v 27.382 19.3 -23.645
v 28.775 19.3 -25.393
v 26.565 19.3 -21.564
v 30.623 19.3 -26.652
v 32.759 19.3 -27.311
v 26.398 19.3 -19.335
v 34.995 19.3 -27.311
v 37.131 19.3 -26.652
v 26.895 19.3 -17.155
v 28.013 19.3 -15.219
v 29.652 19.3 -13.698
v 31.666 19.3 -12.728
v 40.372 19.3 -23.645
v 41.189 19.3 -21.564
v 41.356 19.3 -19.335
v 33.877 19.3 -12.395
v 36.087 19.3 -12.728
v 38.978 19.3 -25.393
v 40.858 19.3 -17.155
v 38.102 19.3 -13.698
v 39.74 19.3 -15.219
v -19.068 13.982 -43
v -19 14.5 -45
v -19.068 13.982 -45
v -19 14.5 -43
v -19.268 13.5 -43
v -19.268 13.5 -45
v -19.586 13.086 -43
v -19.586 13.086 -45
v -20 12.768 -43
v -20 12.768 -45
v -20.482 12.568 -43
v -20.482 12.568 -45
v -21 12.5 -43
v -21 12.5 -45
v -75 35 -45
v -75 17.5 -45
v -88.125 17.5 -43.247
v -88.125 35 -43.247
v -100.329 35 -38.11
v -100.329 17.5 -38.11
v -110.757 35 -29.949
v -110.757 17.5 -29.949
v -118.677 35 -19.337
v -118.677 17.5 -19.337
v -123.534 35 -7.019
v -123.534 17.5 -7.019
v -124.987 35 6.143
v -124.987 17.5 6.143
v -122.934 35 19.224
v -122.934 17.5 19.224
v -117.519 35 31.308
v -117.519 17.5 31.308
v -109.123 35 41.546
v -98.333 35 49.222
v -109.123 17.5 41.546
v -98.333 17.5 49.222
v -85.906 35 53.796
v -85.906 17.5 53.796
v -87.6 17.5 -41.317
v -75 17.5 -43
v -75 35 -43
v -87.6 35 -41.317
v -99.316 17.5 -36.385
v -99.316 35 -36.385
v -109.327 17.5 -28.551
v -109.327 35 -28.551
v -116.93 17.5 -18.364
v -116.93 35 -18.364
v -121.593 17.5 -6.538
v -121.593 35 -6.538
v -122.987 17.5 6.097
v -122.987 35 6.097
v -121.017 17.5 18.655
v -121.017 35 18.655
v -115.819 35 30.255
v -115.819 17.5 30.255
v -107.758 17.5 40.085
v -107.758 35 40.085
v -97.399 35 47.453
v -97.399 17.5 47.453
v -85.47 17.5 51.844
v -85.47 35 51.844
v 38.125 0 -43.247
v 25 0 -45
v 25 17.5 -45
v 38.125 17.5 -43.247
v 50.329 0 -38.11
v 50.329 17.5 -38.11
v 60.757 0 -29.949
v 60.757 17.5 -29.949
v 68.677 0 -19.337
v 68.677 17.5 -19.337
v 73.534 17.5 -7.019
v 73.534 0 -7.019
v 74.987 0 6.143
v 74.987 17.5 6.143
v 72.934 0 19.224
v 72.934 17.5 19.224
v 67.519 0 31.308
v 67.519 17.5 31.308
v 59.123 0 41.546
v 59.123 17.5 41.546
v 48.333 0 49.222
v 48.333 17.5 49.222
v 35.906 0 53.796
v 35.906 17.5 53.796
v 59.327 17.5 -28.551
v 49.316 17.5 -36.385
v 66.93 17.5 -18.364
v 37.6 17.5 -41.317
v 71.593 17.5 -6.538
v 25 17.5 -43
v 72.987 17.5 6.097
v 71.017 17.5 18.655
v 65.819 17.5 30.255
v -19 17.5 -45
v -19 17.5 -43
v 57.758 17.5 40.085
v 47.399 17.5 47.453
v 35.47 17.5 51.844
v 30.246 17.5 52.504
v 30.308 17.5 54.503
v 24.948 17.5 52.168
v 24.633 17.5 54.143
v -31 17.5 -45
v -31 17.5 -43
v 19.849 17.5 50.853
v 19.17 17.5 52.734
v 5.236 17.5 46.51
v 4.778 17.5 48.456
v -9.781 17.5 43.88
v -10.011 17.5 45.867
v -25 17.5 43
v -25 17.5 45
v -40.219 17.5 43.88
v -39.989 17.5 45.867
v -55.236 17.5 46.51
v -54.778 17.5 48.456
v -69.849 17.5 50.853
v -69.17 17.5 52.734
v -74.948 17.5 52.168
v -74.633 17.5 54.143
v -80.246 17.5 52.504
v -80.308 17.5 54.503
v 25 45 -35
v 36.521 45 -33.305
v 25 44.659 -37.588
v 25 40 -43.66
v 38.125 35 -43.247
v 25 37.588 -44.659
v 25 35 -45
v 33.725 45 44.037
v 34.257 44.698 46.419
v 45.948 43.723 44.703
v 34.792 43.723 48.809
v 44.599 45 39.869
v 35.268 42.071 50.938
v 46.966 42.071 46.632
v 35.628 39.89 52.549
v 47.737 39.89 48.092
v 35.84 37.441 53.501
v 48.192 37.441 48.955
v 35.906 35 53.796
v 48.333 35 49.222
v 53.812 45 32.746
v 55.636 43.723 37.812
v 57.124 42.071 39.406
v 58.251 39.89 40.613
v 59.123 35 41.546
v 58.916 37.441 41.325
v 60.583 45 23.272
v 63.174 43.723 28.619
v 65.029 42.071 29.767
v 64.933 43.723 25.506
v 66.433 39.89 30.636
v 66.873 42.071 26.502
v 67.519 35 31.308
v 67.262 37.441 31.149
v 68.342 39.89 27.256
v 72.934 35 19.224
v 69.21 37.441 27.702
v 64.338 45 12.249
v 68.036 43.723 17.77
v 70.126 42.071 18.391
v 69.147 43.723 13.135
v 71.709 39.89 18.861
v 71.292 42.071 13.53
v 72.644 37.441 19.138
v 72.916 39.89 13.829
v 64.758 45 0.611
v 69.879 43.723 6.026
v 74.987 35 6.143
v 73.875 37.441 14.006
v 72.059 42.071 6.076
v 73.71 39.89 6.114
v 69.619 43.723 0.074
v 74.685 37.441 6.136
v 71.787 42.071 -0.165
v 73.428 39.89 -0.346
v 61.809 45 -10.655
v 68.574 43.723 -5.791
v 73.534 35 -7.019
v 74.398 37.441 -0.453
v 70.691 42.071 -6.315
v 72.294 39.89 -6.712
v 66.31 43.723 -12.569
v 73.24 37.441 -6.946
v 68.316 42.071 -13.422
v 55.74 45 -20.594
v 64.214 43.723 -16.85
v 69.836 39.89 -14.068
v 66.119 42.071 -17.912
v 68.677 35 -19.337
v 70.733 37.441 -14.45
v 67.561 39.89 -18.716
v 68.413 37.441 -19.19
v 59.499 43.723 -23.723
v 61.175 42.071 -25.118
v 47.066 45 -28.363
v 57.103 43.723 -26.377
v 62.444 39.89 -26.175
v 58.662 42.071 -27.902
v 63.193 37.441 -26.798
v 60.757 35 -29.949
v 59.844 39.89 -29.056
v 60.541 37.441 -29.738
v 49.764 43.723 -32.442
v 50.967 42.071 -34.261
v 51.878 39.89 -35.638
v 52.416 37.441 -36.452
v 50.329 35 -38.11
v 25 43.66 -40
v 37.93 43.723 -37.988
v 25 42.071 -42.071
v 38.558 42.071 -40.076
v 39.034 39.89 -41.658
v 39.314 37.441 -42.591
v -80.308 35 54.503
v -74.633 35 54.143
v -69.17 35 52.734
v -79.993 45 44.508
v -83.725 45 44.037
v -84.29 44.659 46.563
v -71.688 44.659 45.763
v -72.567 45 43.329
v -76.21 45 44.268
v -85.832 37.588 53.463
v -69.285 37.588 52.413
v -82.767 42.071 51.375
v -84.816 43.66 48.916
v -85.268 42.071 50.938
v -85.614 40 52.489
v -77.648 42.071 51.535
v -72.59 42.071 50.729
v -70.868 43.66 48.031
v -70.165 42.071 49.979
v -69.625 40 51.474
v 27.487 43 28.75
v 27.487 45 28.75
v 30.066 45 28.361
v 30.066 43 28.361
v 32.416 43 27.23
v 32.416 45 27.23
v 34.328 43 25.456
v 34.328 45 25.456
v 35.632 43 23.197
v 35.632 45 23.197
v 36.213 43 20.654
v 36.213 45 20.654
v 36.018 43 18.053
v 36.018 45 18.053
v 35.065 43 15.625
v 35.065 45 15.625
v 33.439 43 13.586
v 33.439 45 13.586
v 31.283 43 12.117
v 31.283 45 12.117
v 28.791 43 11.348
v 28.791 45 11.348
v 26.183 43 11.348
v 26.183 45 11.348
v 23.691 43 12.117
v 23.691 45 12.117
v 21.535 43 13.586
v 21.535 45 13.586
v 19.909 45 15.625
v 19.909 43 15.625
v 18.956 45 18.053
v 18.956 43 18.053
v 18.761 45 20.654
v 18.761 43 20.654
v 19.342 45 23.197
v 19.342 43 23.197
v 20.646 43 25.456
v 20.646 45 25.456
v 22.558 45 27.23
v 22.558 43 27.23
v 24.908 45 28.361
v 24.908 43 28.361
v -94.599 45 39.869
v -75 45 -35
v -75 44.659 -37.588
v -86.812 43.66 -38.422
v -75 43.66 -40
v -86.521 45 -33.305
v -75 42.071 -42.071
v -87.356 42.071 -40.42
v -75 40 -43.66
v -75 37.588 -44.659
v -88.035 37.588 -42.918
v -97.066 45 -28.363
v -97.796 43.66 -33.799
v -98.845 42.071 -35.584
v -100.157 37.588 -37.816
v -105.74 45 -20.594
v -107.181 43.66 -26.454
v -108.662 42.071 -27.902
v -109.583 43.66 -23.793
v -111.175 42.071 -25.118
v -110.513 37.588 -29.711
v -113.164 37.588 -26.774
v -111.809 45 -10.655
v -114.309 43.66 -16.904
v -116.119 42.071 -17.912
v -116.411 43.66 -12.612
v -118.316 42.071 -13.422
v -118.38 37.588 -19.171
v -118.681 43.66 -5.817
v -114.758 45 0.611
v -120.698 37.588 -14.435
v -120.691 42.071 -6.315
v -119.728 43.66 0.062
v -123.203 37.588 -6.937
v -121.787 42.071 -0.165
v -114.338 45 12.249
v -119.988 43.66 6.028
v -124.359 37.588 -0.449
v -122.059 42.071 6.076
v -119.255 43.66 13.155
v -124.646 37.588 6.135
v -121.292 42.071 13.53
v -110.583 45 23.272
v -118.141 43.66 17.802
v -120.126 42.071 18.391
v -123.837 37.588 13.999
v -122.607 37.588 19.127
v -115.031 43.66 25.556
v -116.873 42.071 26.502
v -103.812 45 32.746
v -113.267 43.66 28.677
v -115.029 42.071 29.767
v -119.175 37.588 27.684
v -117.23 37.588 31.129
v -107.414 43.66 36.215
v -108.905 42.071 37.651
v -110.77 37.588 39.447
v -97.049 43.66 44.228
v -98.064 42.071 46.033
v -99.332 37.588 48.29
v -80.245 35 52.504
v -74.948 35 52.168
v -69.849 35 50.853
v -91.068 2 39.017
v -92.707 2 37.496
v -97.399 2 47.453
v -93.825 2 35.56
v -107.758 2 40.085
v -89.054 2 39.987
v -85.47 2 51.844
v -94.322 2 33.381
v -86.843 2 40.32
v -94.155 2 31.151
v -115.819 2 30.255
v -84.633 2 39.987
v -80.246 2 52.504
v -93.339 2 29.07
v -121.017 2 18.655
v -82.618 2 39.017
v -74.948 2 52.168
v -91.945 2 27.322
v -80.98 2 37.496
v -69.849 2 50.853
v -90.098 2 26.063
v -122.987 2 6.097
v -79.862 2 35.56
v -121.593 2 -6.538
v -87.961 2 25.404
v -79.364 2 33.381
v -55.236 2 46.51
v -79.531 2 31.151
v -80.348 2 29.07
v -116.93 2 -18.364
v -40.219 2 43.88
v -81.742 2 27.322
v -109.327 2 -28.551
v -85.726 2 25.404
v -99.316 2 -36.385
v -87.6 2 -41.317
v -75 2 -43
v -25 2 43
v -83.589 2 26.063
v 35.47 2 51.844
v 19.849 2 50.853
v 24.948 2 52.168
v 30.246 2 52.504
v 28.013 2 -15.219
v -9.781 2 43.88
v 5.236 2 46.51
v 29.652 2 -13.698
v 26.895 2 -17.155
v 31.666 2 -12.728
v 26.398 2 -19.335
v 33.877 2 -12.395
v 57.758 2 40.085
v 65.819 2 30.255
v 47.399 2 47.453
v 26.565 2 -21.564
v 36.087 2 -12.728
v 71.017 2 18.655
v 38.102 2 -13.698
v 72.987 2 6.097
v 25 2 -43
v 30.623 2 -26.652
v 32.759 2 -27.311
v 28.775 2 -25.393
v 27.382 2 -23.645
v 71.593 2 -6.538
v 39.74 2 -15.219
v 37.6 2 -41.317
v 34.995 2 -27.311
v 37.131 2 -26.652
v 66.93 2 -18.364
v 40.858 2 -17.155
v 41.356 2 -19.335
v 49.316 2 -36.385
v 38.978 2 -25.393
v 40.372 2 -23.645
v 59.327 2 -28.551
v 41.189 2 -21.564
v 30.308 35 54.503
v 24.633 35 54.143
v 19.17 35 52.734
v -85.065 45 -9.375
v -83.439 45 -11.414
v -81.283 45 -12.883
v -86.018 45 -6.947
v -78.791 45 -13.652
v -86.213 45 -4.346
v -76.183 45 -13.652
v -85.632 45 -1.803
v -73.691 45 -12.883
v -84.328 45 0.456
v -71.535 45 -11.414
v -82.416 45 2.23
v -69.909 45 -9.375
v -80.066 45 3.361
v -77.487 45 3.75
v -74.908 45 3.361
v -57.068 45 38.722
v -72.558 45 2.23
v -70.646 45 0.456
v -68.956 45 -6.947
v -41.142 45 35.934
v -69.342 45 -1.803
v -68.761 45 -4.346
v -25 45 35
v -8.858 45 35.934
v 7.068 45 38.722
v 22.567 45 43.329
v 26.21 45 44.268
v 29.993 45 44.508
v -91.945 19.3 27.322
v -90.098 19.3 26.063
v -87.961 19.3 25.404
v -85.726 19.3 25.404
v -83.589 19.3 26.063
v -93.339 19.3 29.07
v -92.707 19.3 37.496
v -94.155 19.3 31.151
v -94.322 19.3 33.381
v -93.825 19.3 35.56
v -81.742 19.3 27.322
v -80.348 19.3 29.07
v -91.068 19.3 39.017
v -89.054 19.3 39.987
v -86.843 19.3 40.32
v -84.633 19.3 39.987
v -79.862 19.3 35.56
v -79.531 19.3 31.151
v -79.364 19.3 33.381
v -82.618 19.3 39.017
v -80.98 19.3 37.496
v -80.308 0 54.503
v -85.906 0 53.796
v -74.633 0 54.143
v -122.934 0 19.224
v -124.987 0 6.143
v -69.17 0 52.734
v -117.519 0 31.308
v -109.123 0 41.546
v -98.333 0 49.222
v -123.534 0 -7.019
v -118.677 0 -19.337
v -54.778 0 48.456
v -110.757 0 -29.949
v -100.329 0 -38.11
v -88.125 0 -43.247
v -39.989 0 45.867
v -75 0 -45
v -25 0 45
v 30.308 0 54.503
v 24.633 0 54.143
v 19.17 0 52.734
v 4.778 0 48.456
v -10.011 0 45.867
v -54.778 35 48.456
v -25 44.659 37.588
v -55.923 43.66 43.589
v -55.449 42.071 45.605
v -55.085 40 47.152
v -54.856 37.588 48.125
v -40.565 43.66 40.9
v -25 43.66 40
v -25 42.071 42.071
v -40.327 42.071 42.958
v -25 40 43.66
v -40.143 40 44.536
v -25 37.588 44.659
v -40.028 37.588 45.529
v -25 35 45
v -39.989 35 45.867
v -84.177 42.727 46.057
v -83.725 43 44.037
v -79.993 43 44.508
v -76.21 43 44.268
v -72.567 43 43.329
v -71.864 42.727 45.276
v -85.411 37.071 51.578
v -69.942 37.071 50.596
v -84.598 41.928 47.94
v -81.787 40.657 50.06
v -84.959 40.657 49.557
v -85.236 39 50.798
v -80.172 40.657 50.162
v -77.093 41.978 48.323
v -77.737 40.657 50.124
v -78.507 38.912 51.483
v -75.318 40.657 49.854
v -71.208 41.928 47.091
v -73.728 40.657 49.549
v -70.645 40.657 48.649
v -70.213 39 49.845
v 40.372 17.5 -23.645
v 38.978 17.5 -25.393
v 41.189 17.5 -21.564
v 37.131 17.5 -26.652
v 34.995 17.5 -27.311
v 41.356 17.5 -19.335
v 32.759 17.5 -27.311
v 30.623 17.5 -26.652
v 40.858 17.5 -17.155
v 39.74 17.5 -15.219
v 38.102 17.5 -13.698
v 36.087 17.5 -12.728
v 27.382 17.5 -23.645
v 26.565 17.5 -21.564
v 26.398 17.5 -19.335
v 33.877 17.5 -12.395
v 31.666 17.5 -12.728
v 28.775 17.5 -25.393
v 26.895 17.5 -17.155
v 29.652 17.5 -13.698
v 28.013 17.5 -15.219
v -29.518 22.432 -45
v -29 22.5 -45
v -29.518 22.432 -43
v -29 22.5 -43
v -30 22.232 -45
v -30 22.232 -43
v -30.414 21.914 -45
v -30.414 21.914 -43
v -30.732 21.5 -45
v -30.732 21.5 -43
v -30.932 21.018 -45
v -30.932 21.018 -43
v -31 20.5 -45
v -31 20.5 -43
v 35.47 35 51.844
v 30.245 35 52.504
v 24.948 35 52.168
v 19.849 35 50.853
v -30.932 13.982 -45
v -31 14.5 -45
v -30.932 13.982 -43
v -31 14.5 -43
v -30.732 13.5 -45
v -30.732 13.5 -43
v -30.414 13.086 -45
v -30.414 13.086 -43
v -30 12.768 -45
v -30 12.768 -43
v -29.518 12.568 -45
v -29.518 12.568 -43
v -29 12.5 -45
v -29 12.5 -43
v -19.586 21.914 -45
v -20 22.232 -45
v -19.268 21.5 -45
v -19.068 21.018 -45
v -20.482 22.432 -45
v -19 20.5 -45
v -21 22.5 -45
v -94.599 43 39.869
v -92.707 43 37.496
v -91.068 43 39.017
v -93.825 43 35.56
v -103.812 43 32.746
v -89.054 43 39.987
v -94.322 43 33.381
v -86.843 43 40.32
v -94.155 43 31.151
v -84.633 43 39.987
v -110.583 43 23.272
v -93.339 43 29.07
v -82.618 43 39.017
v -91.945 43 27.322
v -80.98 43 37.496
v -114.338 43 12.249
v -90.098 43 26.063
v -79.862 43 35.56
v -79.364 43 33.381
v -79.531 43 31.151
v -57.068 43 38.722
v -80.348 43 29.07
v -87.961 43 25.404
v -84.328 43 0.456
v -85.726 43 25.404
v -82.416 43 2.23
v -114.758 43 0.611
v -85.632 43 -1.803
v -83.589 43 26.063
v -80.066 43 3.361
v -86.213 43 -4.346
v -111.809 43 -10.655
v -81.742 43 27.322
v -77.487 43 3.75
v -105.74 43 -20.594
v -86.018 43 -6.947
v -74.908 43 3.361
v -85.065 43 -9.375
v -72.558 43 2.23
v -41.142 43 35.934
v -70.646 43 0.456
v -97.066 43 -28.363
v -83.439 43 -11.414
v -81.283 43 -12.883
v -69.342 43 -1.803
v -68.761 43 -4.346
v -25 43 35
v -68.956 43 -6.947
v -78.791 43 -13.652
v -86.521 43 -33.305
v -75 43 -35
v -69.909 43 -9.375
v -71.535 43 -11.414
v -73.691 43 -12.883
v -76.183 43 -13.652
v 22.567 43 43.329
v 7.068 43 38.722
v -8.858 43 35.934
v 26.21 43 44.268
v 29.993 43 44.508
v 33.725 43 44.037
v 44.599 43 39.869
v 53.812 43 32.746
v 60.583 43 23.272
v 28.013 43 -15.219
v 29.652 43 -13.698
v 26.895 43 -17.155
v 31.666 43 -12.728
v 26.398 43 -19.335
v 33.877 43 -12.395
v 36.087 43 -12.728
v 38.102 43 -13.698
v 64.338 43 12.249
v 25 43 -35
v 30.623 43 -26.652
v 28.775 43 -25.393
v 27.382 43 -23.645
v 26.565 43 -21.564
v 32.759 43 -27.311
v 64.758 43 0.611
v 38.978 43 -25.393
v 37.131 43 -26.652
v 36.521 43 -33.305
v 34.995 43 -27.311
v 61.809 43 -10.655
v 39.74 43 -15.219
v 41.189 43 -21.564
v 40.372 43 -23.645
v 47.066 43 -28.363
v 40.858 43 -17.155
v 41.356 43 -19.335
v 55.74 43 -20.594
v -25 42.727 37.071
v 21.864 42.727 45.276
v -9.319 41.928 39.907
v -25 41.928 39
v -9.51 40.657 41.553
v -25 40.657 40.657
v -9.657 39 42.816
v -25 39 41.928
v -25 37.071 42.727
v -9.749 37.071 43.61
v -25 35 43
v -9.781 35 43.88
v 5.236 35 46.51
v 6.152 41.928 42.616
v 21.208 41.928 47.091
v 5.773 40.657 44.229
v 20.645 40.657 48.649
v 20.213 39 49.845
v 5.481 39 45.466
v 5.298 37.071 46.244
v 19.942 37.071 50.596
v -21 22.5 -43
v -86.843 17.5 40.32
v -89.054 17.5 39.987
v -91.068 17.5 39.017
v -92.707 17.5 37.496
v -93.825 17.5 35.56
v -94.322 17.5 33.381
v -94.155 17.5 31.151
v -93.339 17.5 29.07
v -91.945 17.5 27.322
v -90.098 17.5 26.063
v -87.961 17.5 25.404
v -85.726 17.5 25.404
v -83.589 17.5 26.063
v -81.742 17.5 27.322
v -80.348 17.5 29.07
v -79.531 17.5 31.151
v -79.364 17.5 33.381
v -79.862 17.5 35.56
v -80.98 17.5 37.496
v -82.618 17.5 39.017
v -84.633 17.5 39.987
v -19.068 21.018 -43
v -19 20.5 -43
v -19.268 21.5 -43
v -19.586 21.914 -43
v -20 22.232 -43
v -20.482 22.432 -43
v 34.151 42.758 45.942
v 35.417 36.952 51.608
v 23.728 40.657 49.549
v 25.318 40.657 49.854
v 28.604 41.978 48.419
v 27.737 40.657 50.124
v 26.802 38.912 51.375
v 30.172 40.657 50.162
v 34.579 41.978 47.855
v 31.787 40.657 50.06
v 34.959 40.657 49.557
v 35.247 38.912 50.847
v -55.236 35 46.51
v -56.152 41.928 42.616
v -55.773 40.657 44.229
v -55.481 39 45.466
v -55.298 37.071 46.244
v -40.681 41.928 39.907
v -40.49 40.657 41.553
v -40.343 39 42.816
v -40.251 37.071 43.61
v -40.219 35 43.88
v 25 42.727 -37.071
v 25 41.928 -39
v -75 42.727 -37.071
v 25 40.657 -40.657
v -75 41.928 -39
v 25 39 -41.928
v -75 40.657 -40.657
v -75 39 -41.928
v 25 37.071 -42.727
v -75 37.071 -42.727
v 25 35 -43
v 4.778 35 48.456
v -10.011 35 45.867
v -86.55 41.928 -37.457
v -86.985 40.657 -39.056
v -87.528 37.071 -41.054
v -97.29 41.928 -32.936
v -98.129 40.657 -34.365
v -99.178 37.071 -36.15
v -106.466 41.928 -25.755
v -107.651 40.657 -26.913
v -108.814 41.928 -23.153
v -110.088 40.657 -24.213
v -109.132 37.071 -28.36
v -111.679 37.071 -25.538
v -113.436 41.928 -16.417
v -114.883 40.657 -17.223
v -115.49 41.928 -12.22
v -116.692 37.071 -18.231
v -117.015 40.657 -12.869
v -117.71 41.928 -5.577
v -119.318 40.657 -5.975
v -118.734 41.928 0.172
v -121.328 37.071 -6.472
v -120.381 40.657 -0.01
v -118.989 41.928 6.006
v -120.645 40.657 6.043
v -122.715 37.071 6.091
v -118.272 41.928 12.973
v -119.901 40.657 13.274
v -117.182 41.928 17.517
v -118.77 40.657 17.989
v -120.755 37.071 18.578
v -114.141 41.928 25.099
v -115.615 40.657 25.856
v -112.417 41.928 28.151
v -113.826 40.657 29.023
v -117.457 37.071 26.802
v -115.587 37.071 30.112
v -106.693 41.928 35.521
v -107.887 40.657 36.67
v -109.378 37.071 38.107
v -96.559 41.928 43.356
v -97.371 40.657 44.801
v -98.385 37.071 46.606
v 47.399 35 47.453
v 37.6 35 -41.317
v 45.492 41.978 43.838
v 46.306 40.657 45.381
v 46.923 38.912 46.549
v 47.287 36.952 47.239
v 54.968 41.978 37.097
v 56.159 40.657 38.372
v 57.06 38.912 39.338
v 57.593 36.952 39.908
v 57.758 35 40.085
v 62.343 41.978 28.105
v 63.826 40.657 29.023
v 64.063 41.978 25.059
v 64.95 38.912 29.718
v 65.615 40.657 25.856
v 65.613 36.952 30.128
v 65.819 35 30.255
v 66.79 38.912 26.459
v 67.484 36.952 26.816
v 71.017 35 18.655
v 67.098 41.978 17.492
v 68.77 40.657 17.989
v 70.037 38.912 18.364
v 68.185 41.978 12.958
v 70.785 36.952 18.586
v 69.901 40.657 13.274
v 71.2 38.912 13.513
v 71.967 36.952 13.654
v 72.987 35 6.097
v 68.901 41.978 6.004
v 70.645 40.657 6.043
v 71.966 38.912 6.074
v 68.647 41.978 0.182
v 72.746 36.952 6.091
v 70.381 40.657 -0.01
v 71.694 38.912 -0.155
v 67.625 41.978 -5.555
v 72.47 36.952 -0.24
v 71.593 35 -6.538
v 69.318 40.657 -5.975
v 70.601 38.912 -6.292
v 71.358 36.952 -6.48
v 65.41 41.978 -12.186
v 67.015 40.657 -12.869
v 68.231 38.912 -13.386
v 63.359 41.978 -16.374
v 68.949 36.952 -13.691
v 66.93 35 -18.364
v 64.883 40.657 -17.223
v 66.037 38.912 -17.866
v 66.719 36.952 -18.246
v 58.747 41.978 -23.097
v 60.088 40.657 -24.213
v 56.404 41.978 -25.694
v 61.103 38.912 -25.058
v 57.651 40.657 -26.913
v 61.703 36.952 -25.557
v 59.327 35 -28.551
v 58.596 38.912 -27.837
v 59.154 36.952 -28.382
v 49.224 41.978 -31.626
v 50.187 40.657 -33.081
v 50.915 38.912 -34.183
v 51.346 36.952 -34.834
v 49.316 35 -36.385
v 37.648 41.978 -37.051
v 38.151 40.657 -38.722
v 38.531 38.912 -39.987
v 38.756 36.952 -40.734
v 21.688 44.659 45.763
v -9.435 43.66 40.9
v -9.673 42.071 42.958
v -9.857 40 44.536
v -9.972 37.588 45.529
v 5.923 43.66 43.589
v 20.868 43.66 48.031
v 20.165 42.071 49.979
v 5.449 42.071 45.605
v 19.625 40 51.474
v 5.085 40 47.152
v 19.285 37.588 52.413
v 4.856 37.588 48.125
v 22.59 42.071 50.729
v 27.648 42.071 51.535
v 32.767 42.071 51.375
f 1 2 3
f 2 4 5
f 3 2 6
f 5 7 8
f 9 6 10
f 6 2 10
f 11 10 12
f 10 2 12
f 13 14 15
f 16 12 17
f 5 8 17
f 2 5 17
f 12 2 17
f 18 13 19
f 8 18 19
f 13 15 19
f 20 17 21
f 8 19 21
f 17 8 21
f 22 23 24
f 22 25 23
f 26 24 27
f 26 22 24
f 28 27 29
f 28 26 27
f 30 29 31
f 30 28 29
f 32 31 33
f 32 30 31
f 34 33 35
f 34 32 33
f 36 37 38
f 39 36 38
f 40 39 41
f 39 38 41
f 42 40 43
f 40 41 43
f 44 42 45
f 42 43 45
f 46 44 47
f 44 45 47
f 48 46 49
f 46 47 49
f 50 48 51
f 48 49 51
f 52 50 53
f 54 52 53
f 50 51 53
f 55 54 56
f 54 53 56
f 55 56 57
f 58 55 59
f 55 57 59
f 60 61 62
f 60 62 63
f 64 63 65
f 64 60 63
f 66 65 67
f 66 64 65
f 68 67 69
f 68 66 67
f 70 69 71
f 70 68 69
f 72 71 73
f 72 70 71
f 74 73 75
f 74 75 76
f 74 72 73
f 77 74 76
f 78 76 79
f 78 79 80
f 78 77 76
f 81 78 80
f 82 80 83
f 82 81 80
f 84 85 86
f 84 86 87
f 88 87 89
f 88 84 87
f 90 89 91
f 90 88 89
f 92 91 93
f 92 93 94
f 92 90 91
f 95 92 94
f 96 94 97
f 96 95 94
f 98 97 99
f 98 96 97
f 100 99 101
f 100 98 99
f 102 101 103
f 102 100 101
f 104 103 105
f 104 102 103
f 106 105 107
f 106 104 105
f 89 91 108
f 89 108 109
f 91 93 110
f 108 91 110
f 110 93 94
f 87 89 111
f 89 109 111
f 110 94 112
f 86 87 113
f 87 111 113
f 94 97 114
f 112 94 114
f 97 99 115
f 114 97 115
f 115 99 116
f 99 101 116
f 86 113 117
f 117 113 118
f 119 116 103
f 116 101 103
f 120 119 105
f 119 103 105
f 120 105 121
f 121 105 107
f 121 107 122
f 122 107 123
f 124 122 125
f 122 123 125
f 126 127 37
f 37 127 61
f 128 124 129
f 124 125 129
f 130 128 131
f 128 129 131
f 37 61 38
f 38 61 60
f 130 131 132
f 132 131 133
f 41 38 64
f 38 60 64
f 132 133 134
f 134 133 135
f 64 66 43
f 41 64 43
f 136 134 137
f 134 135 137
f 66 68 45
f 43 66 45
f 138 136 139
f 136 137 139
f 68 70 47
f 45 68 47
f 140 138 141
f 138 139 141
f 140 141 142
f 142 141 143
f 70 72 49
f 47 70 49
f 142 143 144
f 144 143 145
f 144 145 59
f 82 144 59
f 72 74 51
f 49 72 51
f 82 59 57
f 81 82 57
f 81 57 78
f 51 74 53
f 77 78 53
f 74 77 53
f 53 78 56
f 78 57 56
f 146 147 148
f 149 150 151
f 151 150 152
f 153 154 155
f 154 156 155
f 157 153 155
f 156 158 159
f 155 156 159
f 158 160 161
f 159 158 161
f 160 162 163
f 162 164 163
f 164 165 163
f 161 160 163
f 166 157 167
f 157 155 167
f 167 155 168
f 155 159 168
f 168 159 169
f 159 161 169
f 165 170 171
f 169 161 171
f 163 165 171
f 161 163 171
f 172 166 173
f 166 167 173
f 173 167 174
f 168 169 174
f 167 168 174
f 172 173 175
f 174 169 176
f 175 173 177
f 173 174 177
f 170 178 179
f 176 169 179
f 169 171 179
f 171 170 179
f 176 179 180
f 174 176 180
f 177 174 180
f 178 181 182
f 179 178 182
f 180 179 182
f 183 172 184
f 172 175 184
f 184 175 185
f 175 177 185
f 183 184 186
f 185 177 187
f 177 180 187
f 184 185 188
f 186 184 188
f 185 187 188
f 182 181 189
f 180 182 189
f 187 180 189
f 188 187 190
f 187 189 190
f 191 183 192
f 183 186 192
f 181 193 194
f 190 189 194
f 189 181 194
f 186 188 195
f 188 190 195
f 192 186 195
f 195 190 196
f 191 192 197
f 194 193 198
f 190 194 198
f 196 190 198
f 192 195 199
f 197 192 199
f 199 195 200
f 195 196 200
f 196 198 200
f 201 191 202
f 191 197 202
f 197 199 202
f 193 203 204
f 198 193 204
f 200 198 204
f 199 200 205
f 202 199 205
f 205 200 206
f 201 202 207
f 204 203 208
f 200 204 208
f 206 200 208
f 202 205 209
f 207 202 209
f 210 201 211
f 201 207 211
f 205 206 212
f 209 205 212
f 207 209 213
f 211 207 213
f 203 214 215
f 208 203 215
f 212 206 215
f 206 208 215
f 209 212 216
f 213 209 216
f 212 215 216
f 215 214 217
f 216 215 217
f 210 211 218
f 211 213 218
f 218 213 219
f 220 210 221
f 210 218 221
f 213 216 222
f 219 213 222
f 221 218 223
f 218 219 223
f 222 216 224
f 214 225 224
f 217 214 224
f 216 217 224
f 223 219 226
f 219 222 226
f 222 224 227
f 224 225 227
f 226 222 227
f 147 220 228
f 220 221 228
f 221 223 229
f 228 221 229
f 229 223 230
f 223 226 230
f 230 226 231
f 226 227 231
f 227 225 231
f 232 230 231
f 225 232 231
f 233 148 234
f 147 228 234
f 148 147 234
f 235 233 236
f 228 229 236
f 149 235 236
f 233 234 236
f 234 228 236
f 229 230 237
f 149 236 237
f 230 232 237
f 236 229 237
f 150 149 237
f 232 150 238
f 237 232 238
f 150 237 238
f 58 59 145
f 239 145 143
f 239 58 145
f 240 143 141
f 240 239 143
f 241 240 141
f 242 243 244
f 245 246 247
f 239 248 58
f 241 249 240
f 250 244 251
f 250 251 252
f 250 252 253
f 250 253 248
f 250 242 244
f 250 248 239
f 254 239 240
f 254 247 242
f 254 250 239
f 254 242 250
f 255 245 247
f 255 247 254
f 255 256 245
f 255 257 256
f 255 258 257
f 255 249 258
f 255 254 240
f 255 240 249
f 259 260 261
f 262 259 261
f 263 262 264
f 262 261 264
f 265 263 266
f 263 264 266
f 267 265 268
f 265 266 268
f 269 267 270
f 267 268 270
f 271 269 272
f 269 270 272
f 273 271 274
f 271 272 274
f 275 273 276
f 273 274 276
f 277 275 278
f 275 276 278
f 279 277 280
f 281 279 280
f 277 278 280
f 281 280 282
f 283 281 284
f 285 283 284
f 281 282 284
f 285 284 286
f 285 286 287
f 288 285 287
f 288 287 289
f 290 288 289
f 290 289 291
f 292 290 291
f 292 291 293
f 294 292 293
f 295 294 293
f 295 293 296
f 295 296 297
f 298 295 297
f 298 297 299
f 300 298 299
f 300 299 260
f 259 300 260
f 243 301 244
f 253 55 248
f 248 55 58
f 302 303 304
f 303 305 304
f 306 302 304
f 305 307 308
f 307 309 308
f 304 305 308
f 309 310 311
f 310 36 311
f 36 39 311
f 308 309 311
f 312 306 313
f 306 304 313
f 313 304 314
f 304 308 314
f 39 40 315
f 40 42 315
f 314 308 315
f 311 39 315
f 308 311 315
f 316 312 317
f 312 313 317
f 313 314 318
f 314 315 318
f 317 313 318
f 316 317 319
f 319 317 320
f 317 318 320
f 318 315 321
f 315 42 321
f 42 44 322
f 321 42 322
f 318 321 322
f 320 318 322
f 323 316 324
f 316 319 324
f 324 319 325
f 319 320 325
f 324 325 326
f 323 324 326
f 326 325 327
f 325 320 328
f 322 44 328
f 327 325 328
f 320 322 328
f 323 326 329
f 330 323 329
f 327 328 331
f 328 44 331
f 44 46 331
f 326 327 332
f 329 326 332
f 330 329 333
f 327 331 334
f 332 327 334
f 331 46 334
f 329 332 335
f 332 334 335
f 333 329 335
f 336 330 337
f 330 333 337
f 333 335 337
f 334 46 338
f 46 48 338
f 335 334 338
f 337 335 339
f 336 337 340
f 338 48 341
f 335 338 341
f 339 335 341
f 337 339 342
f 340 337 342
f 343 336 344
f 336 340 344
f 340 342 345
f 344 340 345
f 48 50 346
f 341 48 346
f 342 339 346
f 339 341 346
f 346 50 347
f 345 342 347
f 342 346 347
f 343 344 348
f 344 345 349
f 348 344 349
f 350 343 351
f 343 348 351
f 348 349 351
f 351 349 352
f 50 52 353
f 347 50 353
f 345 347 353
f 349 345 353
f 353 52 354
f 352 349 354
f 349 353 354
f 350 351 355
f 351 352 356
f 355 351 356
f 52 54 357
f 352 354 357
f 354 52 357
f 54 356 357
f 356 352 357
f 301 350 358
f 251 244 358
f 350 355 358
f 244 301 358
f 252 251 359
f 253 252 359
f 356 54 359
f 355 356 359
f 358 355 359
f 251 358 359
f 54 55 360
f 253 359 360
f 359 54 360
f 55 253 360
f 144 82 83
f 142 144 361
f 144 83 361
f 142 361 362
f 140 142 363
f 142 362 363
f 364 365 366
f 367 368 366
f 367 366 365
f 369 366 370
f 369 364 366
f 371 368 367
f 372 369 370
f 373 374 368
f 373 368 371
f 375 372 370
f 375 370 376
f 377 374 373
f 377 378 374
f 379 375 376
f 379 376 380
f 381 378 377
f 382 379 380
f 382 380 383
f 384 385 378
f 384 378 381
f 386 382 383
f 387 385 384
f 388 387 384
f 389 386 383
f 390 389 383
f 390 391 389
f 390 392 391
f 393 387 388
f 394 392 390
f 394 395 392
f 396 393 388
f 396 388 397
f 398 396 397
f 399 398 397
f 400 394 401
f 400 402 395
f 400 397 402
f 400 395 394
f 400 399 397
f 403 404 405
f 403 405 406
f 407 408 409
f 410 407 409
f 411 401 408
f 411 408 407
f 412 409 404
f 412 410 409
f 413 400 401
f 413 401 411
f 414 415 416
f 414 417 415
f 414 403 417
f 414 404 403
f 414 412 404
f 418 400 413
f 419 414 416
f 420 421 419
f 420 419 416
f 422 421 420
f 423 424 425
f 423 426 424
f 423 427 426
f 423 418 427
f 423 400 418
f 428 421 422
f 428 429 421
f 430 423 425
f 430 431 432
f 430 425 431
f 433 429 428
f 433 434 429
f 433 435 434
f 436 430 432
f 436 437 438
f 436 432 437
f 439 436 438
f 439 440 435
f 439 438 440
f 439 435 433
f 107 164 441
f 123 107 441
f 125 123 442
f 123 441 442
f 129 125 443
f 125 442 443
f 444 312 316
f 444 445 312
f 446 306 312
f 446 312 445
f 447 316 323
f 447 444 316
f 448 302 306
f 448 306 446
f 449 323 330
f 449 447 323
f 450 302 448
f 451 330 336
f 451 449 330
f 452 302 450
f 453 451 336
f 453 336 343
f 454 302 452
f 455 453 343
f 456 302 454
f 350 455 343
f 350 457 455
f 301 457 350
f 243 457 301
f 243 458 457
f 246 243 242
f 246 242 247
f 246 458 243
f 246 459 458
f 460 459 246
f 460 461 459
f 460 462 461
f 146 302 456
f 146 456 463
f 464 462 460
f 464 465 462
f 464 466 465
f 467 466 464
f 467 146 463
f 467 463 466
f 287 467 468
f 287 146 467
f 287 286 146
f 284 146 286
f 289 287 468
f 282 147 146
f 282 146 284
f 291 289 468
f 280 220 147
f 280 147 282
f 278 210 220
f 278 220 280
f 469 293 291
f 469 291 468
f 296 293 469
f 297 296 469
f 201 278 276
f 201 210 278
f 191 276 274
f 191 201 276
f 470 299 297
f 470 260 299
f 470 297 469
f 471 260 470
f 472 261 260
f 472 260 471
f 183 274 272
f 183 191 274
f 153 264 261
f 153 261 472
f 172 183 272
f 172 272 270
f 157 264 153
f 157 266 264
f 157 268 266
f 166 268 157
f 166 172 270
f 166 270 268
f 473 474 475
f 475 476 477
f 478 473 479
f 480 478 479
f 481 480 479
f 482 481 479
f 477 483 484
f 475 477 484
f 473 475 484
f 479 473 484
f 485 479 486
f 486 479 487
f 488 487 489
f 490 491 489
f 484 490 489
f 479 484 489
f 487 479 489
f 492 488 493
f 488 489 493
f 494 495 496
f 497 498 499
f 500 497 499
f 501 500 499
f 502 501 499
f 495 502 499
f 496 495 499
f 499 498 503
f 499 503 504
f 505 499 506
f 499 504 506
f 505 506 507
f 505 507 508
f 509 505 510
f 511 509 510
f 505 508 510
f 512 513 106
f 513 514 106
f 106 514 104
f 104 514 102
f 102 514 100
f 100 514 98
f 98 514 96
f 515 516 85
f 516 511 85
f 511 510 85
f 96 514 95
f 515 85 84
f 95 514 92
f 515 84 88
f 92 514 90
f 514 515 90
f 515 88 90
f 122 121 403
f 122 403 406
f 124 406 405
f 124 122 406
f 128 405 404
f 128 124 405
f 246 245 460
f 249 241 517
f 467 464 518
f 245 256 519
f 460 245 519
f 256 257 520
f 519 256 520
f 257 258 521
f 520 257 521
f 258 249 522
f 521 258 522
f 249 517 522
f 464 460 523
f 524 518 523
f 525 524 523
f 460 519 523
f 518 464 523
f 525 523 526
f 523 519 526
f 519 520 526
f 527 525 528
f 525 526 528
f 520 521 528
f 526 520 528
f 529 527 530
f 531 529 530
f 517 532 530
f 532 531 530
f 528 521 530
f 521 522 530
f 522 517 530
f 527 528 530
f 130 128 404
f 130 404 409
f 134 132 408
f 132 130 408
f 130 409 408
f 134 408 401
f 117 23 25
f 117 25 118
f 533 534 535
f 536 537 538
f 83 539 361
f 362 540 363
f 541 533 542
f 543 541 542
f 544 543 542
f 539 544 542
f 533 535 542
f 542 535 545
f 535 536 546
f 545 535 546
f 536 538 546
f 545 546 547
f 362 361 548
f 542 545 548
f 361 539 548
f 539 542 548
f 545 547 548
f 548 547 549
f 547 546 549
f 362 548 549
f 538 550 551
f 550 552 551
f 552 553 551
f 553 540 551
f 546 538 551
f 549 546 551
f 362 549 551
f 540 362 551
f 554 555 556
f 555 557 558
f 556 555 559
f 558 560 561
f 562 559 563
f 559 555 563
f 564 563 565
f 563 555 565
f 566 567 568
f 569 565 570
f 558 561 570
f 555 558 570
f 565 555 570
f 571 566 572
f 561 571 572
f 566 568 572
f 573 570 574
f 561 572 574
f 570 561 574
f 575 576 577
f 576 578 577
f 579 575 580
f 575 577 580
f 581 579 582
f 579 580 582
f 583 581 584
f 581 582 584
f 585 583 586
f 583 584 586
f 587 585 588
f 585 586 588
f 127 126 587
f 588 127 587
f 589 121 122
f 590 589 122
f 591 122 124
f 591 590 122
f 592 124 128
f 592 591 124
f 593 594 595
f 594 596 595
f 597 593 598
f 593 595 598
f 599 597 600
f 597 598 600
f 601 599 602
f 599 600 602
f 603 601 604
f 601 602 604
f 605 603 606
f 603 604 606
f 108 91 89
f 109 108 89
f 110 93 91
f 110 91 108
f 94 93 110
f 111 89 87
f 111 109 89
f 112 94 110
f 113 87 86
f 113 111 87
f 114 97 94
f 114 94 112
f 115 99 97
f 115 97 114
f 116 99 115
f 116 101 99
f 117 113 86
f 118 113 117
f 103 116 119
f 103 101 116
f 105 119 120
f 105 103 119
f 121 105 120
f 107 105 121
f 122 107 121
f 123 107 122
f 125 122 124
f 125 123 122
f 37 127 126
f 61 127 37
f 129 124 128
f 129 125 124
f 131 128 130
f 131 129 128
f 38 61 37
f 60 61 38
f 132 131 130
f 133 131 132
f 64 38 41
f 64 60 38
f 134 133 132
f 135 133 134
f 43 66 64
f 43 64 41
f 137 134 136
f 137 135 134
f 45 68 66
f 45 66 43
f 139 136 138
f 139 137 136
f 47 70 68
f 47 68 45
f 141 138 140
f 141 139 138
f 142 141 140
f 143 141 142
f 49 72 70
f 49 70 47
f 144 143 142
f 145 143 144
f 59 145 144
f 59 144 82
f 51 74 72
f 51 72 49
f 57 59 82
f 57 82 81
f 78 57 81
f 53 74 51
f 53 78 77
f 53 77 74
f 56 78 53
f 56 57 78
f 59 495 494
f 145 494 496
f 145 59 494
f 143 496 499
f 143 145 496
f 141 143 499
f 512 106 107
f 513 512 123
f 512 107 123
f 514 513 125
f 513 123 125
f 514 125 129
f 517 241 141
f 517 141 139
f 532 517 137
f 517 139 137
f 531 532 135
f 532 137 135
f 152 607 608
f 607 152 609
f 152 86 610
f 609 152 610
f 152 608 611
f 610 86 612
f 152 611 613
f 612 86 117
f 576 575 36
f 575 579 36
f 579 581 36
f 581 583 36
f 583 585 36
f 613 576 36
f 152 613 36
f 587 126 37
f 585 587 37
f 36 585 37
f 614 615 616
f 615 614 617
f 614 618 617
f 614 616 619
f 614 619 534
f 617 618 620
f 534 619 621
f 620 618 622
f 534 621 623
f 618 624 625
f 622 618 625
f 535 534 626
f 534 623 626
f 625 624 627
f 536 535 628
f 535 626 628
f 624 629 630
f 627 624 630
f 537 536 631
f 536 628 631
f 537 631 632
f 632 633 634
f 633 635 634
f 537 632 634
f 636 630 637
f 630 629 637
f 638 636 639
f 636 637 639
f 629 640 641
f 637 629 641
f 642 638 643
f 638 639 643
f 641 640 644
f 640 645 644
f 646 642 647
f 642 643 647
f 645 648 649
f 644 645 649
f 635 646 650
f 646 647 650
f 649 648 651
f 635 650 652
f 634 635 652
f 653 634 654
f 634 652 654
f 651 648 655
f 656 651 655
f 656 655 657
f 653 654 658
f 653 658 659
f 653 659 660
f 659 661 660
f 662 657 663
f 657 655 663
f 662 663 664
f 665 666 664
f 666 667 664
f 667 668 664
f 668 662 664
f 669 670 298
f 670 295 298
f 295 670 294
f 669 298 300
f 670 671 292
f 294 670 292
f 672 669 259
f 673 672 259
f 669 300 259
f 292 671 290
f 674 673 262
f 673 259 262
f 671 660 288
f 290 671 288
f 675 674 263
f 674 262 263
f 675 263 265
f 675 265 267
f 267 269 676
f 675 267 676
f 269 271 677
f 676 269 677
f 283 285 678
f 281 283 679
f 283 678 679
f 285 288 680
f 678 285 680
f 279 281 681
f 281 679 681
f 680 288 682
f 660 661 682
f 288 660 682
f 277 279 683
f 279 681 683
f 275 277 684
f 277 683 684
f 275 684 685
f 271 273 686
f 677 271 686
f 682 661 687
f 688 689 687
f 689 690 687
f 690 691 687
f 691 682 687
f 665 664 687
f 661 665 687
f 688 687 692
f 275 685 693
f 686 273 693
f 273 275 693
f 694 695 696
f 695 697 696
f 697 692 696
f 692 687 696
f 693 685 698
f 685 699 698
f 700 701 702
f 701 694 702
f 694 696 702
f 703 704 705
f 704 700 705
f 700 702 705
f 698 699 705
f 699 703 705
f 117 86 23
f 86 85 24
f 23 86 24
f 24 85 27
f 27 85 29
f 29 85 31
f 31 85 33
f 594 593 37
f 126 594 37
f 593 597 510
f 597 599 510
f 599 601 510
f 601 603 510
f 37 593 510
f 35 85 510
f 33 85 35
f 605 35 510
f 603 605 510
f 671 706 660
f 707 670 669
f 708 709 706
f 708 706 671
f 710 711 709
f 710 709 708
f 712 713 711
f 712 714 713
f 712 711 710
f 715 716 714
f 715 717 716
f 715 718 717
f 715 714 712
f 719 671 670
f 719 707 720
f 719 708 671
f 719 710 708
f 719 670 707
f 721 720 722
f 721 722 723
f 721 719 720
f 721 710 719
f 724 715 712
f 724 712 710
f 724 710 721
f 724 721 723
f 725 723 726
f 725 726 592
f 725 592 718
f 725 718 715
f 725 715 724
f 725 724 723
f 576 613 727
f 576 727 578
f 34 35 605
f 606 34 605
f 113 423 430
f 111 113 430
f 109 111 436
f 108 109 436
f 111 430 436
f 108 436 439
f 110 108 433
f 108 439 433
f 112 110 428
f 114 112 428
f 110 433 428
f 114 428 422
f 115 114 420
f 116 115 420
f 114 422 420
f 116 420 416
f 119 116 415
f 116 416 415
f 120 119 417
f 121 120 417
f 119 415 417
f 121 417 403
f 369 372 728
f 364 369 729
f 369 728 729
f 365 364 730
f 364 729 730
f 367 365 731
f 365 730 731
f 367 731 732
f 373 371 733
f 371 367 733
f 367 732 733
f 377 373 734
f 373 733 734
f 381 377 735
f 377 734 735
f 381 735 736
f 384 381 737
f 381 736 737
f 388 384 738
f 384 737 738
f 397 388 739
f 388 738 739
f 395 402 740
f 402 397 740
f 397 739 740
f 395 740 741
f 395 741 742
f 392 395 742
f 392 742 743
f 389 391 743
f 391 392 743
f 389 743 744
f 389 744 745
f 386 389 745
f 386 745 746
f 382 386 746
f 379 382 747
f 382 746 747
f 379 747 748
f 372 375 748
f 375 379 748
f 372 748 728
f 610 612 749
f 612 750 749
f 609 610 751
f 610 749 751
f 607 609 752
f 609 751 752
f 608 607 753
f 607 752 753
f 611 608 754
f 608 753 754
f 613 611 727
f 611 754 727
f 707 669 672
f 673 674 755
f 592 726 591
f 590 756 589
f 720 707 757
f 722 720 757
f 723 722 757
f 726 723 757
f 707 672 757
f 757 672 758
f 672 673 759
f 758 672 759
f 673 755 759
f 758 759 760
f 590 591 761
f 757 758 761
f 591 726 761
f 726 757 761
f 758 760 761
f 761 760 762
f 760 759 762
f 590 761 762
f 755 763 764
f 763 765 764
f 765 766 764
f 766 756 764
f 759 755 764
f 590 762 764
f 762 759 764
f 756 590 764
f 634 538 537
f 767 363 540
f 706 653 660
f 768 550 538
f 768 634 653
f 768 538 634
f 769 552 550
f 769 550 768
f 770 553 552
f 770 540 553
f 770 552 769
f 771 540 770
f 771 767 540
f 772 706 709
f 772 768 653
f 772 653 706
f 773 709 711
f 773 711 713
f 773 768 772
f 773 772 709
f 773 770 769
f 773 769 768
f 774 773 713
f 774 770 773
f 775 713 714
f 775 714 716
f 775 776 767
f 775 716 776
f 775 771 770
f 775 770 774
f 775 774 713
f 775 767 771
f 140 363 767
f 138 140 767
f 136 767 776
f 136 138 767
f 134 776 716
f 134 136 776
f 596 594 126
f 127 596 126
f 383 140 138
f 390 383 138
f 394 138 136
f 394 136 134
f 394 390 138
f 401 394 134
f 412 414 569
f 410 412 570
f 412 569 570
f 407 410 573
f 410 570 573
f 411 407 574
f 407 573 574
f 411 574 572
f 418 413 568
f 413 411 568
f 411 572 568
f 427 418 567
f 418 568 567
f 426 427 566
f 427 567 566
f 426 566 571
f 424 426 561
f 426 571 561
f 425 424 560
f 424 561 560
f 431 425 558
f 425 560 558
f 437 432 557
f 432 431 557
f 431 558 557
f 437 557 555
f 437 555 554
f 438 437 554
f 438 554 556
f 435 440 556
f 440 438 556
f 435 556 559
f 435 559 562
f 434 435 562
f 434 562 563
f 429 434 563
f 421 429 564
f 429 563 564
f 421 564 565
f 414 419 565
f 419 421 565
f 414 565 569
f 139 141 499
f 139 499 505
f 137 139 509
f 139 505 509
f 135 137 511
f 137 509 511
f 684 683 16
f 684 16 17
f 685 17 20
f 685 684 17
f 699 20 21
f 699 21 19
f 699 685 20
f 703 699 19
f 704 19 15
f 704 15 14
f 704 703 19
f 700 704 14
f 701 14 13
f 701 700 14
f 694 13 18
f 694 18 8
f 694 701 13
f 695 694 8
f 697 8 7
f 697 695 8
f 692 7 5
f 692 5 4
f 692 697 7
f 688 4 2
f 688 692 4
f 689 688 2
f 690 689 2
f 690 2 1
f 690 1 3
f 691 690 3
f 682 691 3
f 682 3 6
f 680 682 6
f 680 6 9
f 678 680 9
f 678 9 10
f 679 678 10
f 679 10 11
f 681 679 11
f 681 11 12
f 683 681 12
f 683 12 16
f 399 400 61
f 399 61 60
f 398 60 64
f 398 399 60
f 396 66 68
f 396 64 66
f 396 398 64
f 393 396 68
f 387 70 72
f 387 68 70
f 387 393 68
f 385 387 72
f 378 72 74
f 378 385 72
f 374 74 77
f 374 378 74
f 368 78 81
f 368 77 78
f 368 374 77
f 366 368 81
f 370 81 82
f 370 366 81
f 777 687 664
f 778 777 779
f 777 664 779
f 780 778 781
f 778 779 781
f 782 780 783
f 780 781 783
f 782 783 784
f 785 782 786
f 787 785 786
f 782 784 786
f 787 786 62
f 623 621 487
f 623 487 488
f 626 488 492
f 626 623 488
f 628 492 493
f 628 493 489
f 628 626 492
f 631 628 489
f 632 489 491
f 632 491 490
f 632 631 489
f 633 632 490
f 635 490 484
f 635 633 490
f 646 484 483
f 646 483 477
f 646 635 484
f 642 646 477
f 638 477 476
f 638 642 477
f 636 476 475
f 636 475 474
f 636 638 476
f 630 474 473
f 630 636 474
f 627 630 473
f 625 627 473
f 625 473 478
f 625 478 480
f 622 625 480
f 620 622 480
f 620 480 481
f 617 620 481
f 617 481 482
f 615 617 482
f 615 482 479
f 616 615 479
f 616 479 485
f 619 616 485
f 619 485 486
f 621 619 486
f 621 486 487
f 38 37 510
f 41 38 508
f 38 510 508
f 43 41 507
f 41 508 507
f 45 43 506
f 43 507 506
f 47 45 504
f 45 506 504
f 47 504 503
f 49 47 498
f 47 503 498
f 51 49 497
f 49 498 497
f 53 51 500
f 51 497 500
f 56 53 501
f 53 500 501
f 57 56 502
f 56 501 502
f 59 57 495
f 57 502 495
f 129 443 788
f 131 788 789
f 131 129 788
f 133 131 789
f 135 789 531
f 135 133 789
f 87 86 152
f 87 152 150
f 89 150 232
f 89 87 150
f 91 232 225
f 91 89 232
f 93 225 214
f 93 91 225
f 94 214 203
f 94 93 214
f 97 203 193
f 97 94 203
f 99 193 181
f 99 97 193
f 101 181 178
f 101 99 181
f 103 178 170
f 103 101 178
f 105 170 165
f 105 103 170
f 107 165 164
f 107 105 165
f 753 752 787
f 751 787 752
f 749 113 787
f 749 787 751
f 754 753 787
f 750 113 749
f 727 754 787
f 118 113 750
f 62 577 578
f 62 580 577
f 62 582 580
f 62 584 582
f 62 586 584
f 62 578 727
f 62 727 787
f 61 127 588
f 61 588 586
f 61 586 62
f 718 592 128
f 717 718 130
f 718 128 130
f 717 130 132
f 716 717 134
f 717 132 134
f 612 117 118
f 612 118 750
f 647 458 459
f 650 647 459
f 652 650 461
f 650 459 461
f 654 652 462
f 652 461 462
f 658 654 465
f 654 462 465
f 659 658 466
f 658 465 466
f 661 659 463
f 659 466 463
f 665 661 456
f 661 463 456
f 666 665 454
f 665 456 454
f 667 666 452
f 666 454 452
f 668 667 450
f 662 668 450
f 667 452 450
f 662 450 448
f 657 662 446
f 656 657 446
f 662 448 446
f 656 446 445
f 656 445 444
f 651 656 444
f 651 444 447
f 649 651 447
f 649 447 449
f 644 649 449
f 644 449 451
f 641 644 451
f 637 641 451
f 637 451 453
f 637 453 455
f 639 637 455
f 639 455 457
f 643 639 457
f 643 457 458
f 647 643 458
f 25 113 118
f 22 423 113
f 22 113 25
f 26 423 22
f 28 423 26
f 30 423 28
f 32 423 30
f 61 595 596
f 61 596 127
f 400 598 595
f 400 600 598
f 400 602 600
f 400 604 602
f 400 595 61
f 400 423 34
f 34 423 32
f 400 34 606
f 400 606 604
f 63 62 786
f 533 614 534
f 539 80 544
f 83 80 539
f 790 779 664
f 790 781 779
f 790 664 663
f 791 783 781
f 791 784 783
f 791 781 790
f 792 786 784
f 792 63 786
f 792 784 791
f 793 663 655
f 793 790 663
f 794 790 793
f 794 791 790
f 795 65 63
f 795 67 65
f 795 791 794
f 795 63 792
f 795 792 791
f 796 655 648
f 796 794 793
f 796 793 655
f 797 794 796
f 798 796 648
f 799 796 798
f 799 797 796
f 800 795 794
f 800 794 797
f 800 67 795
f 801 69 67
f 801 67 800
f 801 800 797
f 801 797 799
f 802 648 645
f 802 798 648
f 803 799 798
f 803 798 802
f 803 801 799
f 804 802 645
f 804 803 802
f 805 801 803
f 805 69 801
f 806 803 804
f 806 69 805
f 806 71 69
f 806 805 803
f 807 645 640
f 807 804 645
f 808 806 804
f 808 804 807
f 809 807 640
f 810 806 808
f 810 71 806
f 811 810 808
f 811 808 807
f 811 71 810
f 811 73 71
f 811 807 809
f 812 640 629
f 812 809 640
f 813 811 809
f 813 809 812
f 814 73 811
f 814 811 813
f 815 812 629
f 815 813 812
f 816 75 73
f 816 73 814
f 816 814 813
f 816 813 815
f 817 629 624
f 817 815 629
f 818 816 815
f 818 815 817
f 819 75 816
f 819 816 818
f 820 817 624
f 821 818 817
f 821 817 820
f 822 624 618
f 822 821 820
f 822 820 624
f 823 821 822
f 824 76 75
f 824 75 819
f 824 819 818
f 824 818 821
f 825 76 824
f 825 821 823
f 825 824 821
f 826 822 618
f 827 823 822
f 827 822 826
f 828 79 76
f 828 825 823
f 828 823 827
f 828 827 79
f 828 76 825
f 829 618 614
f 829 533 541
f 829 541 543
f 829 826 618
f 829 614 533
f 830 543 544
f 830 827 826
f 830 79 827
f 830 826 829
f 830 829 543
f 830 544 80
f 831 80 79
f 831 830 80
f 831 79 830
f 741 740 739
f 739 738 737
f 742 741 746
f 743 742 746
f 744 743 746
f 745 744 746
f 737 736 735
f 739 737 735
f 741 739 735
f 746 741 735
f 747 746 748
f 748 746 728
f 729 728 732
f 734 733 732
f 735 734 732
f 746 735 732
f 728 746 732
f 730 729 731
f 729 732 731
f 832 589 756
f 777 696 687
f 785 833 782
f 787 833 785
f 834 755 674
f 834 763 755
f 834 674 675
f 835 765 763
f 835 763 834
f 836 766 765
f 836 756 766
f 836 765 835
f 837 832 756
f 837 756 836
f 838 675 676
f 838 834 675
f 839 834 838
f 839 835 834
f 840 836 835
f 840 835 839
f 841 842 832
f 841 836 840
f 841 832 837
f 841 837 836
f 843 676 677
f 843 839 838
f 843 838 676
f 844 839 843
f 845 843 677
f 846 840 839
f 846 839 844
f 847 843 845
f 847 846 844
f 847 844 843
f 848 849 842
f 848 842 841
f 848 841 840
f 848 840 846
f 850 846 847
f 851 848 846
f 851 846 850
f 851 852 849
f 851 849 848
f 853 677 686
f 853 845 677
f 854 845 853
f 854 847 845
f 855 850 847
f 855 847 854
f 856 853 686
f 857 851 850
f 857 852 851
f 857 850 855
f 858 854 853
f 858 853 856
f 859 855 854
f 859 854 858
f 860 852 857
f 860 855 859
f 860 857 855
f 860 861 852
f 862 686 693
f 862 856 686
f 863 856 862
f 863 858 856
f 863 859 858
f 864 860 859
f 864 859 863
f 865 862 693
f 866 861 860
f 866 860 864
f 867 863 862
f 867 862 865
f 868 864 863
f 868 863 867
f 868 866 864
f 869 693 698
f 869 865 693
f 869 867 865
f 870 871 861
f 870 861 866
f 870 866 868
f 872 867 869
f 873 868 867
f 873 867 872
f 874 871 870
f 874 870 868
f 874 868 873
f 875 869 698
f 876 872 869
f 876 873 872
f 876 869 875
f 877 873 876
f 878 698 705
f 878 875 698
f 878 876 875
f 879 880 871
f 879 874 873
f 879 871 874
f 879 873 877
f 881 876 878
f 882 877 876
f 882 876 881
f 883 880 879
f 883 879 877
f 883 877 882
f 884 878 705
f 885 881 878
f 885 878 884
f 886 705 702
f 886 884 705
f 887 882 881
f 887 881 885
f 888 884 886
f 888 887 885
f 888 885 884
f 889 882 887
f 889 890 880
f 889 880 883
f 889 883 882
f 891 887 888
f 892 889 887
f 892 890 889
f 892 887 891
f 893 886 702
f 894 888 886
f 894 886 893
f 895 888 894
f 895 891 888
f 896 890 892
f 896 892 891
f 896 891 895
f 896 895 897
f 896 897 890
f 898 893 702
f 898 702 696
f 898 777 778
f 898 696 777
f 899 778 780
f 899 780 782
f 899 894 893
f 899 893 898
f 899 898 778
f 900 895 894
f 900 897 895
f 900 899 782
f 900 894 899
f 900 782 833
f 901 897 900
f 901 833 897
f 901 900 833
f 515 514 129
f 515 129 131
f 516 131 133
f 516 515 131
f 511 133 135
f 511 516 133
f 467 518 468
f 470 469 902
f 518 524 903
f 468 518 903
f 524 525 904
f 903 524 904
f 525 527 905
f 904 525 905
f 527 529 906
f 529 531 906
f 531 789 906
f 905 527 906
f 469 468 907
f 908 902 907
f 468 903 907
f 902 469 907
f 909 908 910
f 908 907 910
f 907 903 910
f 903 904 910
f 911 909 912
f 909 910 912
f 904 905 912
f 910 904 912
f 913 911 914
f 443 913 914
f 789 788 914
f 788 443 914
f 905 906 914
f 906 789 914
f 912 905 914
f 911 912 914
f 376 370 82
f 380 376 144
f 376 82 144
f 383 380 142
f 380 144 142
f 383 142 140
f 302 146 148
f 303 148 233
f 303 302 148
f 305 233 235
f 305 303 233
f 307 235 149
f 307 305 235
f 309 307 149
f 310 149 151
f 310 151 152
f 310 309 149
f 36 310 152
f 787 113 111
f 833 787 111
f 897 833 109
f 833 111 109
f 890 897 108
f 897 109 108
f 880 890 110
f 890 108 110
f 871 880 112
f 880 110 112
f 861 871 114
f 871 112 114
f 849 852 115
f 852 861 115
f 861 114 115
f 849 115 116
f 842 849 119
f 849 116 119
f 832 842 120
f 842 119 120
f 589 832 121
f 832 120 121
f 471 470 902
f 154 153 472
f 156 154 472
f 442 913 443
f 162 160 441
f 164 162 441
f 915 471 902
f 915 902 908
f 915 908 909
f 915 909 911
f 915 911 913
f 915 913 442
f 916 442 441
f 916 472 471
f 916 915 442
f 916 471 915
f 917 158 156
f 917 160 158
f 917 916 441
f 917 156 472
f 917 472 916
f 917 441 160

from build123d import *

# Parameters (mm, degrees)
BOSS_EXTRUDE1_DEPTH    = 45
FILLET2_R              = 30
FILLET4_R              = 10
SHELL1_T               = 2
CUT_EXTRUDE1_REACH     = 145.605
SKETCH10_R             = 8.75
SKETCH12_R             = 7.5
BOSS_EXTRUDE2_DEPTH    = 25.7
BOSS_EXTRUDE5_START    = -17.5
SKETCH29_R             = 7.5
BOSS_EXTRUDE5_DEPTH    = 17.5
CUT_EXTRUDE4_REACH     = 167.994
SKETCH13_W             = 12
SKETCH13_H             = 10
FILLET7_R              = 2
SPLIT1_SURFACE_1_BACK  = 228.879
SPLIT1_SURFACE_1_DEPTH = 457.758
SPLIT1_SURFACE_2_BACK  = 228.879
SPLIT1_SURFACE_2_DEPTH = 457.758


with BuildPart() as part:
    # Sketch7 → Boss-Extrude1 (new body)
    with BuildSketch(Plane(origin=(0, 0, 0), x_dir=(1, 0, 0), z_dir=(0, 1, 0))):
        with BuildLine():
            Line((-25, -45), (-25, 45))
            Line((-25, 45), (25, 45))
            ThreePointArc((25, 45), (75, -5), (25, -55))
            ThreePointArc((25, -55), (0.495097568, -47.52451216), (-25, -45))
        make_face()
    extrude(amount=BOSS_EXTRUDE1_DEPTH)

    # Fillet2
    fillet2_edges = [part.edges().sort_by_distance(p)[0] for p in [
        (25, 22.5, 55),
    ]]
    fillet(fillet2_edges, radius=FILLET2_R)

    # Mirror1: part across plane


with BuildPart() as part_1:
    add(part.part)
    add(part.part.mirror(Plane(origin=(-25, 45, 45), x_dir=(0, 0, 1), z_dir=(-1, 0, 0))))

    # Fillet4
    fillet4_edges = [part_1.edges().sort_by_distance(p)[0] for p in [
        (-25, 45, 45),
        (74.6980897, 45, -0.486335772),
        (-25, 45, -45),
        (27.462260721, 45, 54.458155387),
        (-124.6980897, 45, -0.486335772),
        (-77.462260721, 45, 54.458155387),
    ]]
    fillet(fillet4_edges, radius=FILLET4_R)

    # Shell1 (no face opened: a closed hollow body)
    add(offset(amount=-SHELL1_T, mode=Mode.PRIVATE), mode=Mode.SUBTRACT)

    # Sketch10 → Cut-Extrude1 (cut, up to next)
    with BuildSketch(Plane(origin=(0, 45, 0), x_dir=(1, 0, 0), z_dir=(0, 1, 0)), mode=Mode.PRIVATE) as cut_extrude1_sk1:
        with Locations(Location((-77.486999678, 5, 0), (0, 0, 270))):
            Circle(SKETCH10_R)
    cut_extrude1_tool1 = extrude(cut_extrude1_sk1.sketch, amount=-CUT_EXTRUDE1_REACH, mode=Mode.PRIVATE) & part_1.part
    # Sketch10 → Cut-Extrude1 (cut, up to next)
    with BuildSketch(Plane(origin=(0, 45, 0), x_dir=(1, 0, 0), z_dir=(0, 1, 0)), mode=Mode.PRIVATE) as cut_extrude1_sk2:
        with Locations(Location((27.486999678, -20, 0), (0, 0, 270))):
            Circle(SKETCH10_R)
    cut_extrude1_tool2 = extrude(cut_extrude1_sk2.sketch, amount=-CUT_EXTRUDE1_REACH, mode=Mode.PRIVATE) & part_1.part
    add(cut_extrude1_tool1.solids().sort_by_distance((-77.487, 45, -5))[0], mode=Mode.SUBTRACT)
    add(cut_extrude1_tool2.solids().sort_by_distance((27.487, 45, 20))[0], mode=Mode.SUBTRACT)

    # Sketch12 → Boss-Extrude2 (add)
    with BuildSketch(Plane(origin=(0, 45, 0), x_dir=(1, 0, 0), z_dir=(0, 1, 0))):
        with Locations(Location((-86.843377882, -32.820166375, 0), (0, 0, 270))):
            Circle(SKETCH12_R)
        with Locations(Location((33.876721378, 19.89503765, 0), (0, 0, 270))):
            Circle(SKETCH12_R)
    extrude(amount=-BOSS_EXTRUDE2_DEPTH)

    # Sketch29 → Boss-Extrude5 (add)
    with BuildSketch(Plane.XZ.offset(BOSS_EXTRUDE5_START)):
        with Locations(Location((-86.843377882, 32.820166375, 0), (0, 0, 90))):
            Circle(SKETCH29_R)
        with Locations(Location((33.876721378, -19.89503765, 0), (0, 0, 90))):
            Circle(SKETCH29_R)
    extrude(amount=BOSS_EXTRUDE5_DEPTH)

    # Sketch13 → Cut-Extrude4 (cut, up to next)
    with BuildSketch(Plane(origin=(0, 0, -45), x_dir=(-1, 0, 0), z_dir=(0, 0, -1)), mode=Mode.PRIVATE) as cut_extrude4_sk1:
        with Locations((25, 17.5)):
            Rectangle(SKETCH13_W, SKETCH13_H)
    cut_extrude4_tool1 = extrude(cut_extrude4_sk1.sketch, amount=-CUT_EXTRUDE4_REACH, mode=Mode.PRIVATE) & part_1.part
    add(cut_extrude4_tool1.solids().sort_by_distance((-25, 17.5, -45))[0], mode=Mode.SUBTRACT)

    # Fillet7
    fillet7_edges = [part_1.edges().sort_by_distance(p)[0] for p in [
        (-19, 22.5, -44),
        (-31, 22.5, -44),
        (-31, 12.5, -44),
        (-19, 12.5, -44),
    ]]
    fillet(fillet7_edges, radius=FILLET7_R)


with BuildPart() as body_2:
    # Split1: the piece behind the surface
    add(part_1.part)
    # Split1 surface: a surface, the sketch's curves swept straight by 457.758 mm
    with BuildLine(Plane(origin=(0, 0, -45), x_dir=(-1, 0, 0), z_dir=(0, 0, -1)).offset(-SPLIT1_SURFACE_1_BACK), mode=Mode.PRIVATE) as split1_surface_1_path:
        Line((-94.910977175, 17.5), (148.554340896, 17.5))
    split1_surface_1 = Shell.extrude(split1_surface_1_path.wire(), (0 * SPLIT1_SURFACE_1_DEPTH, 0 * SPLIT1_SURFACE_1_DEPTH, -1 * SPLIT1_SURFACE_1_DEPTH))
    split(bisect_by=split1_surface_1, keep=Keep.BOTTOM)


with BuildPart() as part_2:
    add(part_1.part)

    # Split1: split by a surface, the side it looks to stays
    # Split1 surface: a surface, the sketch's curves swept straight by 457.758 mm
    with BuildLine(Plane(origin=(0, 0, -45), x_dir=(-1, 0, 0), z_dir=(0, 0, -1)).offset(-SPLIT1_SURFACE_2_BACK), mode=Mode.PRIVATE) as split1_surface_2_path:
        Line((-94.910977175, 17.5), (148.554340896, 17.5))
    split1_surface_2 = Shell.extrude(split1_surface_2_path.wire(), (0 * SPLIT1_SURFACE_2_DEPTH, 0 * SPLIT1_SURFACE_2_DEPTH, -1 * SPLIT1_SURFACE_2_DEPTH))
    split(bisect_by=split1_surface_2, keep=Keep.TOP)


solid = Compound([body_2.part, part_2.part])
